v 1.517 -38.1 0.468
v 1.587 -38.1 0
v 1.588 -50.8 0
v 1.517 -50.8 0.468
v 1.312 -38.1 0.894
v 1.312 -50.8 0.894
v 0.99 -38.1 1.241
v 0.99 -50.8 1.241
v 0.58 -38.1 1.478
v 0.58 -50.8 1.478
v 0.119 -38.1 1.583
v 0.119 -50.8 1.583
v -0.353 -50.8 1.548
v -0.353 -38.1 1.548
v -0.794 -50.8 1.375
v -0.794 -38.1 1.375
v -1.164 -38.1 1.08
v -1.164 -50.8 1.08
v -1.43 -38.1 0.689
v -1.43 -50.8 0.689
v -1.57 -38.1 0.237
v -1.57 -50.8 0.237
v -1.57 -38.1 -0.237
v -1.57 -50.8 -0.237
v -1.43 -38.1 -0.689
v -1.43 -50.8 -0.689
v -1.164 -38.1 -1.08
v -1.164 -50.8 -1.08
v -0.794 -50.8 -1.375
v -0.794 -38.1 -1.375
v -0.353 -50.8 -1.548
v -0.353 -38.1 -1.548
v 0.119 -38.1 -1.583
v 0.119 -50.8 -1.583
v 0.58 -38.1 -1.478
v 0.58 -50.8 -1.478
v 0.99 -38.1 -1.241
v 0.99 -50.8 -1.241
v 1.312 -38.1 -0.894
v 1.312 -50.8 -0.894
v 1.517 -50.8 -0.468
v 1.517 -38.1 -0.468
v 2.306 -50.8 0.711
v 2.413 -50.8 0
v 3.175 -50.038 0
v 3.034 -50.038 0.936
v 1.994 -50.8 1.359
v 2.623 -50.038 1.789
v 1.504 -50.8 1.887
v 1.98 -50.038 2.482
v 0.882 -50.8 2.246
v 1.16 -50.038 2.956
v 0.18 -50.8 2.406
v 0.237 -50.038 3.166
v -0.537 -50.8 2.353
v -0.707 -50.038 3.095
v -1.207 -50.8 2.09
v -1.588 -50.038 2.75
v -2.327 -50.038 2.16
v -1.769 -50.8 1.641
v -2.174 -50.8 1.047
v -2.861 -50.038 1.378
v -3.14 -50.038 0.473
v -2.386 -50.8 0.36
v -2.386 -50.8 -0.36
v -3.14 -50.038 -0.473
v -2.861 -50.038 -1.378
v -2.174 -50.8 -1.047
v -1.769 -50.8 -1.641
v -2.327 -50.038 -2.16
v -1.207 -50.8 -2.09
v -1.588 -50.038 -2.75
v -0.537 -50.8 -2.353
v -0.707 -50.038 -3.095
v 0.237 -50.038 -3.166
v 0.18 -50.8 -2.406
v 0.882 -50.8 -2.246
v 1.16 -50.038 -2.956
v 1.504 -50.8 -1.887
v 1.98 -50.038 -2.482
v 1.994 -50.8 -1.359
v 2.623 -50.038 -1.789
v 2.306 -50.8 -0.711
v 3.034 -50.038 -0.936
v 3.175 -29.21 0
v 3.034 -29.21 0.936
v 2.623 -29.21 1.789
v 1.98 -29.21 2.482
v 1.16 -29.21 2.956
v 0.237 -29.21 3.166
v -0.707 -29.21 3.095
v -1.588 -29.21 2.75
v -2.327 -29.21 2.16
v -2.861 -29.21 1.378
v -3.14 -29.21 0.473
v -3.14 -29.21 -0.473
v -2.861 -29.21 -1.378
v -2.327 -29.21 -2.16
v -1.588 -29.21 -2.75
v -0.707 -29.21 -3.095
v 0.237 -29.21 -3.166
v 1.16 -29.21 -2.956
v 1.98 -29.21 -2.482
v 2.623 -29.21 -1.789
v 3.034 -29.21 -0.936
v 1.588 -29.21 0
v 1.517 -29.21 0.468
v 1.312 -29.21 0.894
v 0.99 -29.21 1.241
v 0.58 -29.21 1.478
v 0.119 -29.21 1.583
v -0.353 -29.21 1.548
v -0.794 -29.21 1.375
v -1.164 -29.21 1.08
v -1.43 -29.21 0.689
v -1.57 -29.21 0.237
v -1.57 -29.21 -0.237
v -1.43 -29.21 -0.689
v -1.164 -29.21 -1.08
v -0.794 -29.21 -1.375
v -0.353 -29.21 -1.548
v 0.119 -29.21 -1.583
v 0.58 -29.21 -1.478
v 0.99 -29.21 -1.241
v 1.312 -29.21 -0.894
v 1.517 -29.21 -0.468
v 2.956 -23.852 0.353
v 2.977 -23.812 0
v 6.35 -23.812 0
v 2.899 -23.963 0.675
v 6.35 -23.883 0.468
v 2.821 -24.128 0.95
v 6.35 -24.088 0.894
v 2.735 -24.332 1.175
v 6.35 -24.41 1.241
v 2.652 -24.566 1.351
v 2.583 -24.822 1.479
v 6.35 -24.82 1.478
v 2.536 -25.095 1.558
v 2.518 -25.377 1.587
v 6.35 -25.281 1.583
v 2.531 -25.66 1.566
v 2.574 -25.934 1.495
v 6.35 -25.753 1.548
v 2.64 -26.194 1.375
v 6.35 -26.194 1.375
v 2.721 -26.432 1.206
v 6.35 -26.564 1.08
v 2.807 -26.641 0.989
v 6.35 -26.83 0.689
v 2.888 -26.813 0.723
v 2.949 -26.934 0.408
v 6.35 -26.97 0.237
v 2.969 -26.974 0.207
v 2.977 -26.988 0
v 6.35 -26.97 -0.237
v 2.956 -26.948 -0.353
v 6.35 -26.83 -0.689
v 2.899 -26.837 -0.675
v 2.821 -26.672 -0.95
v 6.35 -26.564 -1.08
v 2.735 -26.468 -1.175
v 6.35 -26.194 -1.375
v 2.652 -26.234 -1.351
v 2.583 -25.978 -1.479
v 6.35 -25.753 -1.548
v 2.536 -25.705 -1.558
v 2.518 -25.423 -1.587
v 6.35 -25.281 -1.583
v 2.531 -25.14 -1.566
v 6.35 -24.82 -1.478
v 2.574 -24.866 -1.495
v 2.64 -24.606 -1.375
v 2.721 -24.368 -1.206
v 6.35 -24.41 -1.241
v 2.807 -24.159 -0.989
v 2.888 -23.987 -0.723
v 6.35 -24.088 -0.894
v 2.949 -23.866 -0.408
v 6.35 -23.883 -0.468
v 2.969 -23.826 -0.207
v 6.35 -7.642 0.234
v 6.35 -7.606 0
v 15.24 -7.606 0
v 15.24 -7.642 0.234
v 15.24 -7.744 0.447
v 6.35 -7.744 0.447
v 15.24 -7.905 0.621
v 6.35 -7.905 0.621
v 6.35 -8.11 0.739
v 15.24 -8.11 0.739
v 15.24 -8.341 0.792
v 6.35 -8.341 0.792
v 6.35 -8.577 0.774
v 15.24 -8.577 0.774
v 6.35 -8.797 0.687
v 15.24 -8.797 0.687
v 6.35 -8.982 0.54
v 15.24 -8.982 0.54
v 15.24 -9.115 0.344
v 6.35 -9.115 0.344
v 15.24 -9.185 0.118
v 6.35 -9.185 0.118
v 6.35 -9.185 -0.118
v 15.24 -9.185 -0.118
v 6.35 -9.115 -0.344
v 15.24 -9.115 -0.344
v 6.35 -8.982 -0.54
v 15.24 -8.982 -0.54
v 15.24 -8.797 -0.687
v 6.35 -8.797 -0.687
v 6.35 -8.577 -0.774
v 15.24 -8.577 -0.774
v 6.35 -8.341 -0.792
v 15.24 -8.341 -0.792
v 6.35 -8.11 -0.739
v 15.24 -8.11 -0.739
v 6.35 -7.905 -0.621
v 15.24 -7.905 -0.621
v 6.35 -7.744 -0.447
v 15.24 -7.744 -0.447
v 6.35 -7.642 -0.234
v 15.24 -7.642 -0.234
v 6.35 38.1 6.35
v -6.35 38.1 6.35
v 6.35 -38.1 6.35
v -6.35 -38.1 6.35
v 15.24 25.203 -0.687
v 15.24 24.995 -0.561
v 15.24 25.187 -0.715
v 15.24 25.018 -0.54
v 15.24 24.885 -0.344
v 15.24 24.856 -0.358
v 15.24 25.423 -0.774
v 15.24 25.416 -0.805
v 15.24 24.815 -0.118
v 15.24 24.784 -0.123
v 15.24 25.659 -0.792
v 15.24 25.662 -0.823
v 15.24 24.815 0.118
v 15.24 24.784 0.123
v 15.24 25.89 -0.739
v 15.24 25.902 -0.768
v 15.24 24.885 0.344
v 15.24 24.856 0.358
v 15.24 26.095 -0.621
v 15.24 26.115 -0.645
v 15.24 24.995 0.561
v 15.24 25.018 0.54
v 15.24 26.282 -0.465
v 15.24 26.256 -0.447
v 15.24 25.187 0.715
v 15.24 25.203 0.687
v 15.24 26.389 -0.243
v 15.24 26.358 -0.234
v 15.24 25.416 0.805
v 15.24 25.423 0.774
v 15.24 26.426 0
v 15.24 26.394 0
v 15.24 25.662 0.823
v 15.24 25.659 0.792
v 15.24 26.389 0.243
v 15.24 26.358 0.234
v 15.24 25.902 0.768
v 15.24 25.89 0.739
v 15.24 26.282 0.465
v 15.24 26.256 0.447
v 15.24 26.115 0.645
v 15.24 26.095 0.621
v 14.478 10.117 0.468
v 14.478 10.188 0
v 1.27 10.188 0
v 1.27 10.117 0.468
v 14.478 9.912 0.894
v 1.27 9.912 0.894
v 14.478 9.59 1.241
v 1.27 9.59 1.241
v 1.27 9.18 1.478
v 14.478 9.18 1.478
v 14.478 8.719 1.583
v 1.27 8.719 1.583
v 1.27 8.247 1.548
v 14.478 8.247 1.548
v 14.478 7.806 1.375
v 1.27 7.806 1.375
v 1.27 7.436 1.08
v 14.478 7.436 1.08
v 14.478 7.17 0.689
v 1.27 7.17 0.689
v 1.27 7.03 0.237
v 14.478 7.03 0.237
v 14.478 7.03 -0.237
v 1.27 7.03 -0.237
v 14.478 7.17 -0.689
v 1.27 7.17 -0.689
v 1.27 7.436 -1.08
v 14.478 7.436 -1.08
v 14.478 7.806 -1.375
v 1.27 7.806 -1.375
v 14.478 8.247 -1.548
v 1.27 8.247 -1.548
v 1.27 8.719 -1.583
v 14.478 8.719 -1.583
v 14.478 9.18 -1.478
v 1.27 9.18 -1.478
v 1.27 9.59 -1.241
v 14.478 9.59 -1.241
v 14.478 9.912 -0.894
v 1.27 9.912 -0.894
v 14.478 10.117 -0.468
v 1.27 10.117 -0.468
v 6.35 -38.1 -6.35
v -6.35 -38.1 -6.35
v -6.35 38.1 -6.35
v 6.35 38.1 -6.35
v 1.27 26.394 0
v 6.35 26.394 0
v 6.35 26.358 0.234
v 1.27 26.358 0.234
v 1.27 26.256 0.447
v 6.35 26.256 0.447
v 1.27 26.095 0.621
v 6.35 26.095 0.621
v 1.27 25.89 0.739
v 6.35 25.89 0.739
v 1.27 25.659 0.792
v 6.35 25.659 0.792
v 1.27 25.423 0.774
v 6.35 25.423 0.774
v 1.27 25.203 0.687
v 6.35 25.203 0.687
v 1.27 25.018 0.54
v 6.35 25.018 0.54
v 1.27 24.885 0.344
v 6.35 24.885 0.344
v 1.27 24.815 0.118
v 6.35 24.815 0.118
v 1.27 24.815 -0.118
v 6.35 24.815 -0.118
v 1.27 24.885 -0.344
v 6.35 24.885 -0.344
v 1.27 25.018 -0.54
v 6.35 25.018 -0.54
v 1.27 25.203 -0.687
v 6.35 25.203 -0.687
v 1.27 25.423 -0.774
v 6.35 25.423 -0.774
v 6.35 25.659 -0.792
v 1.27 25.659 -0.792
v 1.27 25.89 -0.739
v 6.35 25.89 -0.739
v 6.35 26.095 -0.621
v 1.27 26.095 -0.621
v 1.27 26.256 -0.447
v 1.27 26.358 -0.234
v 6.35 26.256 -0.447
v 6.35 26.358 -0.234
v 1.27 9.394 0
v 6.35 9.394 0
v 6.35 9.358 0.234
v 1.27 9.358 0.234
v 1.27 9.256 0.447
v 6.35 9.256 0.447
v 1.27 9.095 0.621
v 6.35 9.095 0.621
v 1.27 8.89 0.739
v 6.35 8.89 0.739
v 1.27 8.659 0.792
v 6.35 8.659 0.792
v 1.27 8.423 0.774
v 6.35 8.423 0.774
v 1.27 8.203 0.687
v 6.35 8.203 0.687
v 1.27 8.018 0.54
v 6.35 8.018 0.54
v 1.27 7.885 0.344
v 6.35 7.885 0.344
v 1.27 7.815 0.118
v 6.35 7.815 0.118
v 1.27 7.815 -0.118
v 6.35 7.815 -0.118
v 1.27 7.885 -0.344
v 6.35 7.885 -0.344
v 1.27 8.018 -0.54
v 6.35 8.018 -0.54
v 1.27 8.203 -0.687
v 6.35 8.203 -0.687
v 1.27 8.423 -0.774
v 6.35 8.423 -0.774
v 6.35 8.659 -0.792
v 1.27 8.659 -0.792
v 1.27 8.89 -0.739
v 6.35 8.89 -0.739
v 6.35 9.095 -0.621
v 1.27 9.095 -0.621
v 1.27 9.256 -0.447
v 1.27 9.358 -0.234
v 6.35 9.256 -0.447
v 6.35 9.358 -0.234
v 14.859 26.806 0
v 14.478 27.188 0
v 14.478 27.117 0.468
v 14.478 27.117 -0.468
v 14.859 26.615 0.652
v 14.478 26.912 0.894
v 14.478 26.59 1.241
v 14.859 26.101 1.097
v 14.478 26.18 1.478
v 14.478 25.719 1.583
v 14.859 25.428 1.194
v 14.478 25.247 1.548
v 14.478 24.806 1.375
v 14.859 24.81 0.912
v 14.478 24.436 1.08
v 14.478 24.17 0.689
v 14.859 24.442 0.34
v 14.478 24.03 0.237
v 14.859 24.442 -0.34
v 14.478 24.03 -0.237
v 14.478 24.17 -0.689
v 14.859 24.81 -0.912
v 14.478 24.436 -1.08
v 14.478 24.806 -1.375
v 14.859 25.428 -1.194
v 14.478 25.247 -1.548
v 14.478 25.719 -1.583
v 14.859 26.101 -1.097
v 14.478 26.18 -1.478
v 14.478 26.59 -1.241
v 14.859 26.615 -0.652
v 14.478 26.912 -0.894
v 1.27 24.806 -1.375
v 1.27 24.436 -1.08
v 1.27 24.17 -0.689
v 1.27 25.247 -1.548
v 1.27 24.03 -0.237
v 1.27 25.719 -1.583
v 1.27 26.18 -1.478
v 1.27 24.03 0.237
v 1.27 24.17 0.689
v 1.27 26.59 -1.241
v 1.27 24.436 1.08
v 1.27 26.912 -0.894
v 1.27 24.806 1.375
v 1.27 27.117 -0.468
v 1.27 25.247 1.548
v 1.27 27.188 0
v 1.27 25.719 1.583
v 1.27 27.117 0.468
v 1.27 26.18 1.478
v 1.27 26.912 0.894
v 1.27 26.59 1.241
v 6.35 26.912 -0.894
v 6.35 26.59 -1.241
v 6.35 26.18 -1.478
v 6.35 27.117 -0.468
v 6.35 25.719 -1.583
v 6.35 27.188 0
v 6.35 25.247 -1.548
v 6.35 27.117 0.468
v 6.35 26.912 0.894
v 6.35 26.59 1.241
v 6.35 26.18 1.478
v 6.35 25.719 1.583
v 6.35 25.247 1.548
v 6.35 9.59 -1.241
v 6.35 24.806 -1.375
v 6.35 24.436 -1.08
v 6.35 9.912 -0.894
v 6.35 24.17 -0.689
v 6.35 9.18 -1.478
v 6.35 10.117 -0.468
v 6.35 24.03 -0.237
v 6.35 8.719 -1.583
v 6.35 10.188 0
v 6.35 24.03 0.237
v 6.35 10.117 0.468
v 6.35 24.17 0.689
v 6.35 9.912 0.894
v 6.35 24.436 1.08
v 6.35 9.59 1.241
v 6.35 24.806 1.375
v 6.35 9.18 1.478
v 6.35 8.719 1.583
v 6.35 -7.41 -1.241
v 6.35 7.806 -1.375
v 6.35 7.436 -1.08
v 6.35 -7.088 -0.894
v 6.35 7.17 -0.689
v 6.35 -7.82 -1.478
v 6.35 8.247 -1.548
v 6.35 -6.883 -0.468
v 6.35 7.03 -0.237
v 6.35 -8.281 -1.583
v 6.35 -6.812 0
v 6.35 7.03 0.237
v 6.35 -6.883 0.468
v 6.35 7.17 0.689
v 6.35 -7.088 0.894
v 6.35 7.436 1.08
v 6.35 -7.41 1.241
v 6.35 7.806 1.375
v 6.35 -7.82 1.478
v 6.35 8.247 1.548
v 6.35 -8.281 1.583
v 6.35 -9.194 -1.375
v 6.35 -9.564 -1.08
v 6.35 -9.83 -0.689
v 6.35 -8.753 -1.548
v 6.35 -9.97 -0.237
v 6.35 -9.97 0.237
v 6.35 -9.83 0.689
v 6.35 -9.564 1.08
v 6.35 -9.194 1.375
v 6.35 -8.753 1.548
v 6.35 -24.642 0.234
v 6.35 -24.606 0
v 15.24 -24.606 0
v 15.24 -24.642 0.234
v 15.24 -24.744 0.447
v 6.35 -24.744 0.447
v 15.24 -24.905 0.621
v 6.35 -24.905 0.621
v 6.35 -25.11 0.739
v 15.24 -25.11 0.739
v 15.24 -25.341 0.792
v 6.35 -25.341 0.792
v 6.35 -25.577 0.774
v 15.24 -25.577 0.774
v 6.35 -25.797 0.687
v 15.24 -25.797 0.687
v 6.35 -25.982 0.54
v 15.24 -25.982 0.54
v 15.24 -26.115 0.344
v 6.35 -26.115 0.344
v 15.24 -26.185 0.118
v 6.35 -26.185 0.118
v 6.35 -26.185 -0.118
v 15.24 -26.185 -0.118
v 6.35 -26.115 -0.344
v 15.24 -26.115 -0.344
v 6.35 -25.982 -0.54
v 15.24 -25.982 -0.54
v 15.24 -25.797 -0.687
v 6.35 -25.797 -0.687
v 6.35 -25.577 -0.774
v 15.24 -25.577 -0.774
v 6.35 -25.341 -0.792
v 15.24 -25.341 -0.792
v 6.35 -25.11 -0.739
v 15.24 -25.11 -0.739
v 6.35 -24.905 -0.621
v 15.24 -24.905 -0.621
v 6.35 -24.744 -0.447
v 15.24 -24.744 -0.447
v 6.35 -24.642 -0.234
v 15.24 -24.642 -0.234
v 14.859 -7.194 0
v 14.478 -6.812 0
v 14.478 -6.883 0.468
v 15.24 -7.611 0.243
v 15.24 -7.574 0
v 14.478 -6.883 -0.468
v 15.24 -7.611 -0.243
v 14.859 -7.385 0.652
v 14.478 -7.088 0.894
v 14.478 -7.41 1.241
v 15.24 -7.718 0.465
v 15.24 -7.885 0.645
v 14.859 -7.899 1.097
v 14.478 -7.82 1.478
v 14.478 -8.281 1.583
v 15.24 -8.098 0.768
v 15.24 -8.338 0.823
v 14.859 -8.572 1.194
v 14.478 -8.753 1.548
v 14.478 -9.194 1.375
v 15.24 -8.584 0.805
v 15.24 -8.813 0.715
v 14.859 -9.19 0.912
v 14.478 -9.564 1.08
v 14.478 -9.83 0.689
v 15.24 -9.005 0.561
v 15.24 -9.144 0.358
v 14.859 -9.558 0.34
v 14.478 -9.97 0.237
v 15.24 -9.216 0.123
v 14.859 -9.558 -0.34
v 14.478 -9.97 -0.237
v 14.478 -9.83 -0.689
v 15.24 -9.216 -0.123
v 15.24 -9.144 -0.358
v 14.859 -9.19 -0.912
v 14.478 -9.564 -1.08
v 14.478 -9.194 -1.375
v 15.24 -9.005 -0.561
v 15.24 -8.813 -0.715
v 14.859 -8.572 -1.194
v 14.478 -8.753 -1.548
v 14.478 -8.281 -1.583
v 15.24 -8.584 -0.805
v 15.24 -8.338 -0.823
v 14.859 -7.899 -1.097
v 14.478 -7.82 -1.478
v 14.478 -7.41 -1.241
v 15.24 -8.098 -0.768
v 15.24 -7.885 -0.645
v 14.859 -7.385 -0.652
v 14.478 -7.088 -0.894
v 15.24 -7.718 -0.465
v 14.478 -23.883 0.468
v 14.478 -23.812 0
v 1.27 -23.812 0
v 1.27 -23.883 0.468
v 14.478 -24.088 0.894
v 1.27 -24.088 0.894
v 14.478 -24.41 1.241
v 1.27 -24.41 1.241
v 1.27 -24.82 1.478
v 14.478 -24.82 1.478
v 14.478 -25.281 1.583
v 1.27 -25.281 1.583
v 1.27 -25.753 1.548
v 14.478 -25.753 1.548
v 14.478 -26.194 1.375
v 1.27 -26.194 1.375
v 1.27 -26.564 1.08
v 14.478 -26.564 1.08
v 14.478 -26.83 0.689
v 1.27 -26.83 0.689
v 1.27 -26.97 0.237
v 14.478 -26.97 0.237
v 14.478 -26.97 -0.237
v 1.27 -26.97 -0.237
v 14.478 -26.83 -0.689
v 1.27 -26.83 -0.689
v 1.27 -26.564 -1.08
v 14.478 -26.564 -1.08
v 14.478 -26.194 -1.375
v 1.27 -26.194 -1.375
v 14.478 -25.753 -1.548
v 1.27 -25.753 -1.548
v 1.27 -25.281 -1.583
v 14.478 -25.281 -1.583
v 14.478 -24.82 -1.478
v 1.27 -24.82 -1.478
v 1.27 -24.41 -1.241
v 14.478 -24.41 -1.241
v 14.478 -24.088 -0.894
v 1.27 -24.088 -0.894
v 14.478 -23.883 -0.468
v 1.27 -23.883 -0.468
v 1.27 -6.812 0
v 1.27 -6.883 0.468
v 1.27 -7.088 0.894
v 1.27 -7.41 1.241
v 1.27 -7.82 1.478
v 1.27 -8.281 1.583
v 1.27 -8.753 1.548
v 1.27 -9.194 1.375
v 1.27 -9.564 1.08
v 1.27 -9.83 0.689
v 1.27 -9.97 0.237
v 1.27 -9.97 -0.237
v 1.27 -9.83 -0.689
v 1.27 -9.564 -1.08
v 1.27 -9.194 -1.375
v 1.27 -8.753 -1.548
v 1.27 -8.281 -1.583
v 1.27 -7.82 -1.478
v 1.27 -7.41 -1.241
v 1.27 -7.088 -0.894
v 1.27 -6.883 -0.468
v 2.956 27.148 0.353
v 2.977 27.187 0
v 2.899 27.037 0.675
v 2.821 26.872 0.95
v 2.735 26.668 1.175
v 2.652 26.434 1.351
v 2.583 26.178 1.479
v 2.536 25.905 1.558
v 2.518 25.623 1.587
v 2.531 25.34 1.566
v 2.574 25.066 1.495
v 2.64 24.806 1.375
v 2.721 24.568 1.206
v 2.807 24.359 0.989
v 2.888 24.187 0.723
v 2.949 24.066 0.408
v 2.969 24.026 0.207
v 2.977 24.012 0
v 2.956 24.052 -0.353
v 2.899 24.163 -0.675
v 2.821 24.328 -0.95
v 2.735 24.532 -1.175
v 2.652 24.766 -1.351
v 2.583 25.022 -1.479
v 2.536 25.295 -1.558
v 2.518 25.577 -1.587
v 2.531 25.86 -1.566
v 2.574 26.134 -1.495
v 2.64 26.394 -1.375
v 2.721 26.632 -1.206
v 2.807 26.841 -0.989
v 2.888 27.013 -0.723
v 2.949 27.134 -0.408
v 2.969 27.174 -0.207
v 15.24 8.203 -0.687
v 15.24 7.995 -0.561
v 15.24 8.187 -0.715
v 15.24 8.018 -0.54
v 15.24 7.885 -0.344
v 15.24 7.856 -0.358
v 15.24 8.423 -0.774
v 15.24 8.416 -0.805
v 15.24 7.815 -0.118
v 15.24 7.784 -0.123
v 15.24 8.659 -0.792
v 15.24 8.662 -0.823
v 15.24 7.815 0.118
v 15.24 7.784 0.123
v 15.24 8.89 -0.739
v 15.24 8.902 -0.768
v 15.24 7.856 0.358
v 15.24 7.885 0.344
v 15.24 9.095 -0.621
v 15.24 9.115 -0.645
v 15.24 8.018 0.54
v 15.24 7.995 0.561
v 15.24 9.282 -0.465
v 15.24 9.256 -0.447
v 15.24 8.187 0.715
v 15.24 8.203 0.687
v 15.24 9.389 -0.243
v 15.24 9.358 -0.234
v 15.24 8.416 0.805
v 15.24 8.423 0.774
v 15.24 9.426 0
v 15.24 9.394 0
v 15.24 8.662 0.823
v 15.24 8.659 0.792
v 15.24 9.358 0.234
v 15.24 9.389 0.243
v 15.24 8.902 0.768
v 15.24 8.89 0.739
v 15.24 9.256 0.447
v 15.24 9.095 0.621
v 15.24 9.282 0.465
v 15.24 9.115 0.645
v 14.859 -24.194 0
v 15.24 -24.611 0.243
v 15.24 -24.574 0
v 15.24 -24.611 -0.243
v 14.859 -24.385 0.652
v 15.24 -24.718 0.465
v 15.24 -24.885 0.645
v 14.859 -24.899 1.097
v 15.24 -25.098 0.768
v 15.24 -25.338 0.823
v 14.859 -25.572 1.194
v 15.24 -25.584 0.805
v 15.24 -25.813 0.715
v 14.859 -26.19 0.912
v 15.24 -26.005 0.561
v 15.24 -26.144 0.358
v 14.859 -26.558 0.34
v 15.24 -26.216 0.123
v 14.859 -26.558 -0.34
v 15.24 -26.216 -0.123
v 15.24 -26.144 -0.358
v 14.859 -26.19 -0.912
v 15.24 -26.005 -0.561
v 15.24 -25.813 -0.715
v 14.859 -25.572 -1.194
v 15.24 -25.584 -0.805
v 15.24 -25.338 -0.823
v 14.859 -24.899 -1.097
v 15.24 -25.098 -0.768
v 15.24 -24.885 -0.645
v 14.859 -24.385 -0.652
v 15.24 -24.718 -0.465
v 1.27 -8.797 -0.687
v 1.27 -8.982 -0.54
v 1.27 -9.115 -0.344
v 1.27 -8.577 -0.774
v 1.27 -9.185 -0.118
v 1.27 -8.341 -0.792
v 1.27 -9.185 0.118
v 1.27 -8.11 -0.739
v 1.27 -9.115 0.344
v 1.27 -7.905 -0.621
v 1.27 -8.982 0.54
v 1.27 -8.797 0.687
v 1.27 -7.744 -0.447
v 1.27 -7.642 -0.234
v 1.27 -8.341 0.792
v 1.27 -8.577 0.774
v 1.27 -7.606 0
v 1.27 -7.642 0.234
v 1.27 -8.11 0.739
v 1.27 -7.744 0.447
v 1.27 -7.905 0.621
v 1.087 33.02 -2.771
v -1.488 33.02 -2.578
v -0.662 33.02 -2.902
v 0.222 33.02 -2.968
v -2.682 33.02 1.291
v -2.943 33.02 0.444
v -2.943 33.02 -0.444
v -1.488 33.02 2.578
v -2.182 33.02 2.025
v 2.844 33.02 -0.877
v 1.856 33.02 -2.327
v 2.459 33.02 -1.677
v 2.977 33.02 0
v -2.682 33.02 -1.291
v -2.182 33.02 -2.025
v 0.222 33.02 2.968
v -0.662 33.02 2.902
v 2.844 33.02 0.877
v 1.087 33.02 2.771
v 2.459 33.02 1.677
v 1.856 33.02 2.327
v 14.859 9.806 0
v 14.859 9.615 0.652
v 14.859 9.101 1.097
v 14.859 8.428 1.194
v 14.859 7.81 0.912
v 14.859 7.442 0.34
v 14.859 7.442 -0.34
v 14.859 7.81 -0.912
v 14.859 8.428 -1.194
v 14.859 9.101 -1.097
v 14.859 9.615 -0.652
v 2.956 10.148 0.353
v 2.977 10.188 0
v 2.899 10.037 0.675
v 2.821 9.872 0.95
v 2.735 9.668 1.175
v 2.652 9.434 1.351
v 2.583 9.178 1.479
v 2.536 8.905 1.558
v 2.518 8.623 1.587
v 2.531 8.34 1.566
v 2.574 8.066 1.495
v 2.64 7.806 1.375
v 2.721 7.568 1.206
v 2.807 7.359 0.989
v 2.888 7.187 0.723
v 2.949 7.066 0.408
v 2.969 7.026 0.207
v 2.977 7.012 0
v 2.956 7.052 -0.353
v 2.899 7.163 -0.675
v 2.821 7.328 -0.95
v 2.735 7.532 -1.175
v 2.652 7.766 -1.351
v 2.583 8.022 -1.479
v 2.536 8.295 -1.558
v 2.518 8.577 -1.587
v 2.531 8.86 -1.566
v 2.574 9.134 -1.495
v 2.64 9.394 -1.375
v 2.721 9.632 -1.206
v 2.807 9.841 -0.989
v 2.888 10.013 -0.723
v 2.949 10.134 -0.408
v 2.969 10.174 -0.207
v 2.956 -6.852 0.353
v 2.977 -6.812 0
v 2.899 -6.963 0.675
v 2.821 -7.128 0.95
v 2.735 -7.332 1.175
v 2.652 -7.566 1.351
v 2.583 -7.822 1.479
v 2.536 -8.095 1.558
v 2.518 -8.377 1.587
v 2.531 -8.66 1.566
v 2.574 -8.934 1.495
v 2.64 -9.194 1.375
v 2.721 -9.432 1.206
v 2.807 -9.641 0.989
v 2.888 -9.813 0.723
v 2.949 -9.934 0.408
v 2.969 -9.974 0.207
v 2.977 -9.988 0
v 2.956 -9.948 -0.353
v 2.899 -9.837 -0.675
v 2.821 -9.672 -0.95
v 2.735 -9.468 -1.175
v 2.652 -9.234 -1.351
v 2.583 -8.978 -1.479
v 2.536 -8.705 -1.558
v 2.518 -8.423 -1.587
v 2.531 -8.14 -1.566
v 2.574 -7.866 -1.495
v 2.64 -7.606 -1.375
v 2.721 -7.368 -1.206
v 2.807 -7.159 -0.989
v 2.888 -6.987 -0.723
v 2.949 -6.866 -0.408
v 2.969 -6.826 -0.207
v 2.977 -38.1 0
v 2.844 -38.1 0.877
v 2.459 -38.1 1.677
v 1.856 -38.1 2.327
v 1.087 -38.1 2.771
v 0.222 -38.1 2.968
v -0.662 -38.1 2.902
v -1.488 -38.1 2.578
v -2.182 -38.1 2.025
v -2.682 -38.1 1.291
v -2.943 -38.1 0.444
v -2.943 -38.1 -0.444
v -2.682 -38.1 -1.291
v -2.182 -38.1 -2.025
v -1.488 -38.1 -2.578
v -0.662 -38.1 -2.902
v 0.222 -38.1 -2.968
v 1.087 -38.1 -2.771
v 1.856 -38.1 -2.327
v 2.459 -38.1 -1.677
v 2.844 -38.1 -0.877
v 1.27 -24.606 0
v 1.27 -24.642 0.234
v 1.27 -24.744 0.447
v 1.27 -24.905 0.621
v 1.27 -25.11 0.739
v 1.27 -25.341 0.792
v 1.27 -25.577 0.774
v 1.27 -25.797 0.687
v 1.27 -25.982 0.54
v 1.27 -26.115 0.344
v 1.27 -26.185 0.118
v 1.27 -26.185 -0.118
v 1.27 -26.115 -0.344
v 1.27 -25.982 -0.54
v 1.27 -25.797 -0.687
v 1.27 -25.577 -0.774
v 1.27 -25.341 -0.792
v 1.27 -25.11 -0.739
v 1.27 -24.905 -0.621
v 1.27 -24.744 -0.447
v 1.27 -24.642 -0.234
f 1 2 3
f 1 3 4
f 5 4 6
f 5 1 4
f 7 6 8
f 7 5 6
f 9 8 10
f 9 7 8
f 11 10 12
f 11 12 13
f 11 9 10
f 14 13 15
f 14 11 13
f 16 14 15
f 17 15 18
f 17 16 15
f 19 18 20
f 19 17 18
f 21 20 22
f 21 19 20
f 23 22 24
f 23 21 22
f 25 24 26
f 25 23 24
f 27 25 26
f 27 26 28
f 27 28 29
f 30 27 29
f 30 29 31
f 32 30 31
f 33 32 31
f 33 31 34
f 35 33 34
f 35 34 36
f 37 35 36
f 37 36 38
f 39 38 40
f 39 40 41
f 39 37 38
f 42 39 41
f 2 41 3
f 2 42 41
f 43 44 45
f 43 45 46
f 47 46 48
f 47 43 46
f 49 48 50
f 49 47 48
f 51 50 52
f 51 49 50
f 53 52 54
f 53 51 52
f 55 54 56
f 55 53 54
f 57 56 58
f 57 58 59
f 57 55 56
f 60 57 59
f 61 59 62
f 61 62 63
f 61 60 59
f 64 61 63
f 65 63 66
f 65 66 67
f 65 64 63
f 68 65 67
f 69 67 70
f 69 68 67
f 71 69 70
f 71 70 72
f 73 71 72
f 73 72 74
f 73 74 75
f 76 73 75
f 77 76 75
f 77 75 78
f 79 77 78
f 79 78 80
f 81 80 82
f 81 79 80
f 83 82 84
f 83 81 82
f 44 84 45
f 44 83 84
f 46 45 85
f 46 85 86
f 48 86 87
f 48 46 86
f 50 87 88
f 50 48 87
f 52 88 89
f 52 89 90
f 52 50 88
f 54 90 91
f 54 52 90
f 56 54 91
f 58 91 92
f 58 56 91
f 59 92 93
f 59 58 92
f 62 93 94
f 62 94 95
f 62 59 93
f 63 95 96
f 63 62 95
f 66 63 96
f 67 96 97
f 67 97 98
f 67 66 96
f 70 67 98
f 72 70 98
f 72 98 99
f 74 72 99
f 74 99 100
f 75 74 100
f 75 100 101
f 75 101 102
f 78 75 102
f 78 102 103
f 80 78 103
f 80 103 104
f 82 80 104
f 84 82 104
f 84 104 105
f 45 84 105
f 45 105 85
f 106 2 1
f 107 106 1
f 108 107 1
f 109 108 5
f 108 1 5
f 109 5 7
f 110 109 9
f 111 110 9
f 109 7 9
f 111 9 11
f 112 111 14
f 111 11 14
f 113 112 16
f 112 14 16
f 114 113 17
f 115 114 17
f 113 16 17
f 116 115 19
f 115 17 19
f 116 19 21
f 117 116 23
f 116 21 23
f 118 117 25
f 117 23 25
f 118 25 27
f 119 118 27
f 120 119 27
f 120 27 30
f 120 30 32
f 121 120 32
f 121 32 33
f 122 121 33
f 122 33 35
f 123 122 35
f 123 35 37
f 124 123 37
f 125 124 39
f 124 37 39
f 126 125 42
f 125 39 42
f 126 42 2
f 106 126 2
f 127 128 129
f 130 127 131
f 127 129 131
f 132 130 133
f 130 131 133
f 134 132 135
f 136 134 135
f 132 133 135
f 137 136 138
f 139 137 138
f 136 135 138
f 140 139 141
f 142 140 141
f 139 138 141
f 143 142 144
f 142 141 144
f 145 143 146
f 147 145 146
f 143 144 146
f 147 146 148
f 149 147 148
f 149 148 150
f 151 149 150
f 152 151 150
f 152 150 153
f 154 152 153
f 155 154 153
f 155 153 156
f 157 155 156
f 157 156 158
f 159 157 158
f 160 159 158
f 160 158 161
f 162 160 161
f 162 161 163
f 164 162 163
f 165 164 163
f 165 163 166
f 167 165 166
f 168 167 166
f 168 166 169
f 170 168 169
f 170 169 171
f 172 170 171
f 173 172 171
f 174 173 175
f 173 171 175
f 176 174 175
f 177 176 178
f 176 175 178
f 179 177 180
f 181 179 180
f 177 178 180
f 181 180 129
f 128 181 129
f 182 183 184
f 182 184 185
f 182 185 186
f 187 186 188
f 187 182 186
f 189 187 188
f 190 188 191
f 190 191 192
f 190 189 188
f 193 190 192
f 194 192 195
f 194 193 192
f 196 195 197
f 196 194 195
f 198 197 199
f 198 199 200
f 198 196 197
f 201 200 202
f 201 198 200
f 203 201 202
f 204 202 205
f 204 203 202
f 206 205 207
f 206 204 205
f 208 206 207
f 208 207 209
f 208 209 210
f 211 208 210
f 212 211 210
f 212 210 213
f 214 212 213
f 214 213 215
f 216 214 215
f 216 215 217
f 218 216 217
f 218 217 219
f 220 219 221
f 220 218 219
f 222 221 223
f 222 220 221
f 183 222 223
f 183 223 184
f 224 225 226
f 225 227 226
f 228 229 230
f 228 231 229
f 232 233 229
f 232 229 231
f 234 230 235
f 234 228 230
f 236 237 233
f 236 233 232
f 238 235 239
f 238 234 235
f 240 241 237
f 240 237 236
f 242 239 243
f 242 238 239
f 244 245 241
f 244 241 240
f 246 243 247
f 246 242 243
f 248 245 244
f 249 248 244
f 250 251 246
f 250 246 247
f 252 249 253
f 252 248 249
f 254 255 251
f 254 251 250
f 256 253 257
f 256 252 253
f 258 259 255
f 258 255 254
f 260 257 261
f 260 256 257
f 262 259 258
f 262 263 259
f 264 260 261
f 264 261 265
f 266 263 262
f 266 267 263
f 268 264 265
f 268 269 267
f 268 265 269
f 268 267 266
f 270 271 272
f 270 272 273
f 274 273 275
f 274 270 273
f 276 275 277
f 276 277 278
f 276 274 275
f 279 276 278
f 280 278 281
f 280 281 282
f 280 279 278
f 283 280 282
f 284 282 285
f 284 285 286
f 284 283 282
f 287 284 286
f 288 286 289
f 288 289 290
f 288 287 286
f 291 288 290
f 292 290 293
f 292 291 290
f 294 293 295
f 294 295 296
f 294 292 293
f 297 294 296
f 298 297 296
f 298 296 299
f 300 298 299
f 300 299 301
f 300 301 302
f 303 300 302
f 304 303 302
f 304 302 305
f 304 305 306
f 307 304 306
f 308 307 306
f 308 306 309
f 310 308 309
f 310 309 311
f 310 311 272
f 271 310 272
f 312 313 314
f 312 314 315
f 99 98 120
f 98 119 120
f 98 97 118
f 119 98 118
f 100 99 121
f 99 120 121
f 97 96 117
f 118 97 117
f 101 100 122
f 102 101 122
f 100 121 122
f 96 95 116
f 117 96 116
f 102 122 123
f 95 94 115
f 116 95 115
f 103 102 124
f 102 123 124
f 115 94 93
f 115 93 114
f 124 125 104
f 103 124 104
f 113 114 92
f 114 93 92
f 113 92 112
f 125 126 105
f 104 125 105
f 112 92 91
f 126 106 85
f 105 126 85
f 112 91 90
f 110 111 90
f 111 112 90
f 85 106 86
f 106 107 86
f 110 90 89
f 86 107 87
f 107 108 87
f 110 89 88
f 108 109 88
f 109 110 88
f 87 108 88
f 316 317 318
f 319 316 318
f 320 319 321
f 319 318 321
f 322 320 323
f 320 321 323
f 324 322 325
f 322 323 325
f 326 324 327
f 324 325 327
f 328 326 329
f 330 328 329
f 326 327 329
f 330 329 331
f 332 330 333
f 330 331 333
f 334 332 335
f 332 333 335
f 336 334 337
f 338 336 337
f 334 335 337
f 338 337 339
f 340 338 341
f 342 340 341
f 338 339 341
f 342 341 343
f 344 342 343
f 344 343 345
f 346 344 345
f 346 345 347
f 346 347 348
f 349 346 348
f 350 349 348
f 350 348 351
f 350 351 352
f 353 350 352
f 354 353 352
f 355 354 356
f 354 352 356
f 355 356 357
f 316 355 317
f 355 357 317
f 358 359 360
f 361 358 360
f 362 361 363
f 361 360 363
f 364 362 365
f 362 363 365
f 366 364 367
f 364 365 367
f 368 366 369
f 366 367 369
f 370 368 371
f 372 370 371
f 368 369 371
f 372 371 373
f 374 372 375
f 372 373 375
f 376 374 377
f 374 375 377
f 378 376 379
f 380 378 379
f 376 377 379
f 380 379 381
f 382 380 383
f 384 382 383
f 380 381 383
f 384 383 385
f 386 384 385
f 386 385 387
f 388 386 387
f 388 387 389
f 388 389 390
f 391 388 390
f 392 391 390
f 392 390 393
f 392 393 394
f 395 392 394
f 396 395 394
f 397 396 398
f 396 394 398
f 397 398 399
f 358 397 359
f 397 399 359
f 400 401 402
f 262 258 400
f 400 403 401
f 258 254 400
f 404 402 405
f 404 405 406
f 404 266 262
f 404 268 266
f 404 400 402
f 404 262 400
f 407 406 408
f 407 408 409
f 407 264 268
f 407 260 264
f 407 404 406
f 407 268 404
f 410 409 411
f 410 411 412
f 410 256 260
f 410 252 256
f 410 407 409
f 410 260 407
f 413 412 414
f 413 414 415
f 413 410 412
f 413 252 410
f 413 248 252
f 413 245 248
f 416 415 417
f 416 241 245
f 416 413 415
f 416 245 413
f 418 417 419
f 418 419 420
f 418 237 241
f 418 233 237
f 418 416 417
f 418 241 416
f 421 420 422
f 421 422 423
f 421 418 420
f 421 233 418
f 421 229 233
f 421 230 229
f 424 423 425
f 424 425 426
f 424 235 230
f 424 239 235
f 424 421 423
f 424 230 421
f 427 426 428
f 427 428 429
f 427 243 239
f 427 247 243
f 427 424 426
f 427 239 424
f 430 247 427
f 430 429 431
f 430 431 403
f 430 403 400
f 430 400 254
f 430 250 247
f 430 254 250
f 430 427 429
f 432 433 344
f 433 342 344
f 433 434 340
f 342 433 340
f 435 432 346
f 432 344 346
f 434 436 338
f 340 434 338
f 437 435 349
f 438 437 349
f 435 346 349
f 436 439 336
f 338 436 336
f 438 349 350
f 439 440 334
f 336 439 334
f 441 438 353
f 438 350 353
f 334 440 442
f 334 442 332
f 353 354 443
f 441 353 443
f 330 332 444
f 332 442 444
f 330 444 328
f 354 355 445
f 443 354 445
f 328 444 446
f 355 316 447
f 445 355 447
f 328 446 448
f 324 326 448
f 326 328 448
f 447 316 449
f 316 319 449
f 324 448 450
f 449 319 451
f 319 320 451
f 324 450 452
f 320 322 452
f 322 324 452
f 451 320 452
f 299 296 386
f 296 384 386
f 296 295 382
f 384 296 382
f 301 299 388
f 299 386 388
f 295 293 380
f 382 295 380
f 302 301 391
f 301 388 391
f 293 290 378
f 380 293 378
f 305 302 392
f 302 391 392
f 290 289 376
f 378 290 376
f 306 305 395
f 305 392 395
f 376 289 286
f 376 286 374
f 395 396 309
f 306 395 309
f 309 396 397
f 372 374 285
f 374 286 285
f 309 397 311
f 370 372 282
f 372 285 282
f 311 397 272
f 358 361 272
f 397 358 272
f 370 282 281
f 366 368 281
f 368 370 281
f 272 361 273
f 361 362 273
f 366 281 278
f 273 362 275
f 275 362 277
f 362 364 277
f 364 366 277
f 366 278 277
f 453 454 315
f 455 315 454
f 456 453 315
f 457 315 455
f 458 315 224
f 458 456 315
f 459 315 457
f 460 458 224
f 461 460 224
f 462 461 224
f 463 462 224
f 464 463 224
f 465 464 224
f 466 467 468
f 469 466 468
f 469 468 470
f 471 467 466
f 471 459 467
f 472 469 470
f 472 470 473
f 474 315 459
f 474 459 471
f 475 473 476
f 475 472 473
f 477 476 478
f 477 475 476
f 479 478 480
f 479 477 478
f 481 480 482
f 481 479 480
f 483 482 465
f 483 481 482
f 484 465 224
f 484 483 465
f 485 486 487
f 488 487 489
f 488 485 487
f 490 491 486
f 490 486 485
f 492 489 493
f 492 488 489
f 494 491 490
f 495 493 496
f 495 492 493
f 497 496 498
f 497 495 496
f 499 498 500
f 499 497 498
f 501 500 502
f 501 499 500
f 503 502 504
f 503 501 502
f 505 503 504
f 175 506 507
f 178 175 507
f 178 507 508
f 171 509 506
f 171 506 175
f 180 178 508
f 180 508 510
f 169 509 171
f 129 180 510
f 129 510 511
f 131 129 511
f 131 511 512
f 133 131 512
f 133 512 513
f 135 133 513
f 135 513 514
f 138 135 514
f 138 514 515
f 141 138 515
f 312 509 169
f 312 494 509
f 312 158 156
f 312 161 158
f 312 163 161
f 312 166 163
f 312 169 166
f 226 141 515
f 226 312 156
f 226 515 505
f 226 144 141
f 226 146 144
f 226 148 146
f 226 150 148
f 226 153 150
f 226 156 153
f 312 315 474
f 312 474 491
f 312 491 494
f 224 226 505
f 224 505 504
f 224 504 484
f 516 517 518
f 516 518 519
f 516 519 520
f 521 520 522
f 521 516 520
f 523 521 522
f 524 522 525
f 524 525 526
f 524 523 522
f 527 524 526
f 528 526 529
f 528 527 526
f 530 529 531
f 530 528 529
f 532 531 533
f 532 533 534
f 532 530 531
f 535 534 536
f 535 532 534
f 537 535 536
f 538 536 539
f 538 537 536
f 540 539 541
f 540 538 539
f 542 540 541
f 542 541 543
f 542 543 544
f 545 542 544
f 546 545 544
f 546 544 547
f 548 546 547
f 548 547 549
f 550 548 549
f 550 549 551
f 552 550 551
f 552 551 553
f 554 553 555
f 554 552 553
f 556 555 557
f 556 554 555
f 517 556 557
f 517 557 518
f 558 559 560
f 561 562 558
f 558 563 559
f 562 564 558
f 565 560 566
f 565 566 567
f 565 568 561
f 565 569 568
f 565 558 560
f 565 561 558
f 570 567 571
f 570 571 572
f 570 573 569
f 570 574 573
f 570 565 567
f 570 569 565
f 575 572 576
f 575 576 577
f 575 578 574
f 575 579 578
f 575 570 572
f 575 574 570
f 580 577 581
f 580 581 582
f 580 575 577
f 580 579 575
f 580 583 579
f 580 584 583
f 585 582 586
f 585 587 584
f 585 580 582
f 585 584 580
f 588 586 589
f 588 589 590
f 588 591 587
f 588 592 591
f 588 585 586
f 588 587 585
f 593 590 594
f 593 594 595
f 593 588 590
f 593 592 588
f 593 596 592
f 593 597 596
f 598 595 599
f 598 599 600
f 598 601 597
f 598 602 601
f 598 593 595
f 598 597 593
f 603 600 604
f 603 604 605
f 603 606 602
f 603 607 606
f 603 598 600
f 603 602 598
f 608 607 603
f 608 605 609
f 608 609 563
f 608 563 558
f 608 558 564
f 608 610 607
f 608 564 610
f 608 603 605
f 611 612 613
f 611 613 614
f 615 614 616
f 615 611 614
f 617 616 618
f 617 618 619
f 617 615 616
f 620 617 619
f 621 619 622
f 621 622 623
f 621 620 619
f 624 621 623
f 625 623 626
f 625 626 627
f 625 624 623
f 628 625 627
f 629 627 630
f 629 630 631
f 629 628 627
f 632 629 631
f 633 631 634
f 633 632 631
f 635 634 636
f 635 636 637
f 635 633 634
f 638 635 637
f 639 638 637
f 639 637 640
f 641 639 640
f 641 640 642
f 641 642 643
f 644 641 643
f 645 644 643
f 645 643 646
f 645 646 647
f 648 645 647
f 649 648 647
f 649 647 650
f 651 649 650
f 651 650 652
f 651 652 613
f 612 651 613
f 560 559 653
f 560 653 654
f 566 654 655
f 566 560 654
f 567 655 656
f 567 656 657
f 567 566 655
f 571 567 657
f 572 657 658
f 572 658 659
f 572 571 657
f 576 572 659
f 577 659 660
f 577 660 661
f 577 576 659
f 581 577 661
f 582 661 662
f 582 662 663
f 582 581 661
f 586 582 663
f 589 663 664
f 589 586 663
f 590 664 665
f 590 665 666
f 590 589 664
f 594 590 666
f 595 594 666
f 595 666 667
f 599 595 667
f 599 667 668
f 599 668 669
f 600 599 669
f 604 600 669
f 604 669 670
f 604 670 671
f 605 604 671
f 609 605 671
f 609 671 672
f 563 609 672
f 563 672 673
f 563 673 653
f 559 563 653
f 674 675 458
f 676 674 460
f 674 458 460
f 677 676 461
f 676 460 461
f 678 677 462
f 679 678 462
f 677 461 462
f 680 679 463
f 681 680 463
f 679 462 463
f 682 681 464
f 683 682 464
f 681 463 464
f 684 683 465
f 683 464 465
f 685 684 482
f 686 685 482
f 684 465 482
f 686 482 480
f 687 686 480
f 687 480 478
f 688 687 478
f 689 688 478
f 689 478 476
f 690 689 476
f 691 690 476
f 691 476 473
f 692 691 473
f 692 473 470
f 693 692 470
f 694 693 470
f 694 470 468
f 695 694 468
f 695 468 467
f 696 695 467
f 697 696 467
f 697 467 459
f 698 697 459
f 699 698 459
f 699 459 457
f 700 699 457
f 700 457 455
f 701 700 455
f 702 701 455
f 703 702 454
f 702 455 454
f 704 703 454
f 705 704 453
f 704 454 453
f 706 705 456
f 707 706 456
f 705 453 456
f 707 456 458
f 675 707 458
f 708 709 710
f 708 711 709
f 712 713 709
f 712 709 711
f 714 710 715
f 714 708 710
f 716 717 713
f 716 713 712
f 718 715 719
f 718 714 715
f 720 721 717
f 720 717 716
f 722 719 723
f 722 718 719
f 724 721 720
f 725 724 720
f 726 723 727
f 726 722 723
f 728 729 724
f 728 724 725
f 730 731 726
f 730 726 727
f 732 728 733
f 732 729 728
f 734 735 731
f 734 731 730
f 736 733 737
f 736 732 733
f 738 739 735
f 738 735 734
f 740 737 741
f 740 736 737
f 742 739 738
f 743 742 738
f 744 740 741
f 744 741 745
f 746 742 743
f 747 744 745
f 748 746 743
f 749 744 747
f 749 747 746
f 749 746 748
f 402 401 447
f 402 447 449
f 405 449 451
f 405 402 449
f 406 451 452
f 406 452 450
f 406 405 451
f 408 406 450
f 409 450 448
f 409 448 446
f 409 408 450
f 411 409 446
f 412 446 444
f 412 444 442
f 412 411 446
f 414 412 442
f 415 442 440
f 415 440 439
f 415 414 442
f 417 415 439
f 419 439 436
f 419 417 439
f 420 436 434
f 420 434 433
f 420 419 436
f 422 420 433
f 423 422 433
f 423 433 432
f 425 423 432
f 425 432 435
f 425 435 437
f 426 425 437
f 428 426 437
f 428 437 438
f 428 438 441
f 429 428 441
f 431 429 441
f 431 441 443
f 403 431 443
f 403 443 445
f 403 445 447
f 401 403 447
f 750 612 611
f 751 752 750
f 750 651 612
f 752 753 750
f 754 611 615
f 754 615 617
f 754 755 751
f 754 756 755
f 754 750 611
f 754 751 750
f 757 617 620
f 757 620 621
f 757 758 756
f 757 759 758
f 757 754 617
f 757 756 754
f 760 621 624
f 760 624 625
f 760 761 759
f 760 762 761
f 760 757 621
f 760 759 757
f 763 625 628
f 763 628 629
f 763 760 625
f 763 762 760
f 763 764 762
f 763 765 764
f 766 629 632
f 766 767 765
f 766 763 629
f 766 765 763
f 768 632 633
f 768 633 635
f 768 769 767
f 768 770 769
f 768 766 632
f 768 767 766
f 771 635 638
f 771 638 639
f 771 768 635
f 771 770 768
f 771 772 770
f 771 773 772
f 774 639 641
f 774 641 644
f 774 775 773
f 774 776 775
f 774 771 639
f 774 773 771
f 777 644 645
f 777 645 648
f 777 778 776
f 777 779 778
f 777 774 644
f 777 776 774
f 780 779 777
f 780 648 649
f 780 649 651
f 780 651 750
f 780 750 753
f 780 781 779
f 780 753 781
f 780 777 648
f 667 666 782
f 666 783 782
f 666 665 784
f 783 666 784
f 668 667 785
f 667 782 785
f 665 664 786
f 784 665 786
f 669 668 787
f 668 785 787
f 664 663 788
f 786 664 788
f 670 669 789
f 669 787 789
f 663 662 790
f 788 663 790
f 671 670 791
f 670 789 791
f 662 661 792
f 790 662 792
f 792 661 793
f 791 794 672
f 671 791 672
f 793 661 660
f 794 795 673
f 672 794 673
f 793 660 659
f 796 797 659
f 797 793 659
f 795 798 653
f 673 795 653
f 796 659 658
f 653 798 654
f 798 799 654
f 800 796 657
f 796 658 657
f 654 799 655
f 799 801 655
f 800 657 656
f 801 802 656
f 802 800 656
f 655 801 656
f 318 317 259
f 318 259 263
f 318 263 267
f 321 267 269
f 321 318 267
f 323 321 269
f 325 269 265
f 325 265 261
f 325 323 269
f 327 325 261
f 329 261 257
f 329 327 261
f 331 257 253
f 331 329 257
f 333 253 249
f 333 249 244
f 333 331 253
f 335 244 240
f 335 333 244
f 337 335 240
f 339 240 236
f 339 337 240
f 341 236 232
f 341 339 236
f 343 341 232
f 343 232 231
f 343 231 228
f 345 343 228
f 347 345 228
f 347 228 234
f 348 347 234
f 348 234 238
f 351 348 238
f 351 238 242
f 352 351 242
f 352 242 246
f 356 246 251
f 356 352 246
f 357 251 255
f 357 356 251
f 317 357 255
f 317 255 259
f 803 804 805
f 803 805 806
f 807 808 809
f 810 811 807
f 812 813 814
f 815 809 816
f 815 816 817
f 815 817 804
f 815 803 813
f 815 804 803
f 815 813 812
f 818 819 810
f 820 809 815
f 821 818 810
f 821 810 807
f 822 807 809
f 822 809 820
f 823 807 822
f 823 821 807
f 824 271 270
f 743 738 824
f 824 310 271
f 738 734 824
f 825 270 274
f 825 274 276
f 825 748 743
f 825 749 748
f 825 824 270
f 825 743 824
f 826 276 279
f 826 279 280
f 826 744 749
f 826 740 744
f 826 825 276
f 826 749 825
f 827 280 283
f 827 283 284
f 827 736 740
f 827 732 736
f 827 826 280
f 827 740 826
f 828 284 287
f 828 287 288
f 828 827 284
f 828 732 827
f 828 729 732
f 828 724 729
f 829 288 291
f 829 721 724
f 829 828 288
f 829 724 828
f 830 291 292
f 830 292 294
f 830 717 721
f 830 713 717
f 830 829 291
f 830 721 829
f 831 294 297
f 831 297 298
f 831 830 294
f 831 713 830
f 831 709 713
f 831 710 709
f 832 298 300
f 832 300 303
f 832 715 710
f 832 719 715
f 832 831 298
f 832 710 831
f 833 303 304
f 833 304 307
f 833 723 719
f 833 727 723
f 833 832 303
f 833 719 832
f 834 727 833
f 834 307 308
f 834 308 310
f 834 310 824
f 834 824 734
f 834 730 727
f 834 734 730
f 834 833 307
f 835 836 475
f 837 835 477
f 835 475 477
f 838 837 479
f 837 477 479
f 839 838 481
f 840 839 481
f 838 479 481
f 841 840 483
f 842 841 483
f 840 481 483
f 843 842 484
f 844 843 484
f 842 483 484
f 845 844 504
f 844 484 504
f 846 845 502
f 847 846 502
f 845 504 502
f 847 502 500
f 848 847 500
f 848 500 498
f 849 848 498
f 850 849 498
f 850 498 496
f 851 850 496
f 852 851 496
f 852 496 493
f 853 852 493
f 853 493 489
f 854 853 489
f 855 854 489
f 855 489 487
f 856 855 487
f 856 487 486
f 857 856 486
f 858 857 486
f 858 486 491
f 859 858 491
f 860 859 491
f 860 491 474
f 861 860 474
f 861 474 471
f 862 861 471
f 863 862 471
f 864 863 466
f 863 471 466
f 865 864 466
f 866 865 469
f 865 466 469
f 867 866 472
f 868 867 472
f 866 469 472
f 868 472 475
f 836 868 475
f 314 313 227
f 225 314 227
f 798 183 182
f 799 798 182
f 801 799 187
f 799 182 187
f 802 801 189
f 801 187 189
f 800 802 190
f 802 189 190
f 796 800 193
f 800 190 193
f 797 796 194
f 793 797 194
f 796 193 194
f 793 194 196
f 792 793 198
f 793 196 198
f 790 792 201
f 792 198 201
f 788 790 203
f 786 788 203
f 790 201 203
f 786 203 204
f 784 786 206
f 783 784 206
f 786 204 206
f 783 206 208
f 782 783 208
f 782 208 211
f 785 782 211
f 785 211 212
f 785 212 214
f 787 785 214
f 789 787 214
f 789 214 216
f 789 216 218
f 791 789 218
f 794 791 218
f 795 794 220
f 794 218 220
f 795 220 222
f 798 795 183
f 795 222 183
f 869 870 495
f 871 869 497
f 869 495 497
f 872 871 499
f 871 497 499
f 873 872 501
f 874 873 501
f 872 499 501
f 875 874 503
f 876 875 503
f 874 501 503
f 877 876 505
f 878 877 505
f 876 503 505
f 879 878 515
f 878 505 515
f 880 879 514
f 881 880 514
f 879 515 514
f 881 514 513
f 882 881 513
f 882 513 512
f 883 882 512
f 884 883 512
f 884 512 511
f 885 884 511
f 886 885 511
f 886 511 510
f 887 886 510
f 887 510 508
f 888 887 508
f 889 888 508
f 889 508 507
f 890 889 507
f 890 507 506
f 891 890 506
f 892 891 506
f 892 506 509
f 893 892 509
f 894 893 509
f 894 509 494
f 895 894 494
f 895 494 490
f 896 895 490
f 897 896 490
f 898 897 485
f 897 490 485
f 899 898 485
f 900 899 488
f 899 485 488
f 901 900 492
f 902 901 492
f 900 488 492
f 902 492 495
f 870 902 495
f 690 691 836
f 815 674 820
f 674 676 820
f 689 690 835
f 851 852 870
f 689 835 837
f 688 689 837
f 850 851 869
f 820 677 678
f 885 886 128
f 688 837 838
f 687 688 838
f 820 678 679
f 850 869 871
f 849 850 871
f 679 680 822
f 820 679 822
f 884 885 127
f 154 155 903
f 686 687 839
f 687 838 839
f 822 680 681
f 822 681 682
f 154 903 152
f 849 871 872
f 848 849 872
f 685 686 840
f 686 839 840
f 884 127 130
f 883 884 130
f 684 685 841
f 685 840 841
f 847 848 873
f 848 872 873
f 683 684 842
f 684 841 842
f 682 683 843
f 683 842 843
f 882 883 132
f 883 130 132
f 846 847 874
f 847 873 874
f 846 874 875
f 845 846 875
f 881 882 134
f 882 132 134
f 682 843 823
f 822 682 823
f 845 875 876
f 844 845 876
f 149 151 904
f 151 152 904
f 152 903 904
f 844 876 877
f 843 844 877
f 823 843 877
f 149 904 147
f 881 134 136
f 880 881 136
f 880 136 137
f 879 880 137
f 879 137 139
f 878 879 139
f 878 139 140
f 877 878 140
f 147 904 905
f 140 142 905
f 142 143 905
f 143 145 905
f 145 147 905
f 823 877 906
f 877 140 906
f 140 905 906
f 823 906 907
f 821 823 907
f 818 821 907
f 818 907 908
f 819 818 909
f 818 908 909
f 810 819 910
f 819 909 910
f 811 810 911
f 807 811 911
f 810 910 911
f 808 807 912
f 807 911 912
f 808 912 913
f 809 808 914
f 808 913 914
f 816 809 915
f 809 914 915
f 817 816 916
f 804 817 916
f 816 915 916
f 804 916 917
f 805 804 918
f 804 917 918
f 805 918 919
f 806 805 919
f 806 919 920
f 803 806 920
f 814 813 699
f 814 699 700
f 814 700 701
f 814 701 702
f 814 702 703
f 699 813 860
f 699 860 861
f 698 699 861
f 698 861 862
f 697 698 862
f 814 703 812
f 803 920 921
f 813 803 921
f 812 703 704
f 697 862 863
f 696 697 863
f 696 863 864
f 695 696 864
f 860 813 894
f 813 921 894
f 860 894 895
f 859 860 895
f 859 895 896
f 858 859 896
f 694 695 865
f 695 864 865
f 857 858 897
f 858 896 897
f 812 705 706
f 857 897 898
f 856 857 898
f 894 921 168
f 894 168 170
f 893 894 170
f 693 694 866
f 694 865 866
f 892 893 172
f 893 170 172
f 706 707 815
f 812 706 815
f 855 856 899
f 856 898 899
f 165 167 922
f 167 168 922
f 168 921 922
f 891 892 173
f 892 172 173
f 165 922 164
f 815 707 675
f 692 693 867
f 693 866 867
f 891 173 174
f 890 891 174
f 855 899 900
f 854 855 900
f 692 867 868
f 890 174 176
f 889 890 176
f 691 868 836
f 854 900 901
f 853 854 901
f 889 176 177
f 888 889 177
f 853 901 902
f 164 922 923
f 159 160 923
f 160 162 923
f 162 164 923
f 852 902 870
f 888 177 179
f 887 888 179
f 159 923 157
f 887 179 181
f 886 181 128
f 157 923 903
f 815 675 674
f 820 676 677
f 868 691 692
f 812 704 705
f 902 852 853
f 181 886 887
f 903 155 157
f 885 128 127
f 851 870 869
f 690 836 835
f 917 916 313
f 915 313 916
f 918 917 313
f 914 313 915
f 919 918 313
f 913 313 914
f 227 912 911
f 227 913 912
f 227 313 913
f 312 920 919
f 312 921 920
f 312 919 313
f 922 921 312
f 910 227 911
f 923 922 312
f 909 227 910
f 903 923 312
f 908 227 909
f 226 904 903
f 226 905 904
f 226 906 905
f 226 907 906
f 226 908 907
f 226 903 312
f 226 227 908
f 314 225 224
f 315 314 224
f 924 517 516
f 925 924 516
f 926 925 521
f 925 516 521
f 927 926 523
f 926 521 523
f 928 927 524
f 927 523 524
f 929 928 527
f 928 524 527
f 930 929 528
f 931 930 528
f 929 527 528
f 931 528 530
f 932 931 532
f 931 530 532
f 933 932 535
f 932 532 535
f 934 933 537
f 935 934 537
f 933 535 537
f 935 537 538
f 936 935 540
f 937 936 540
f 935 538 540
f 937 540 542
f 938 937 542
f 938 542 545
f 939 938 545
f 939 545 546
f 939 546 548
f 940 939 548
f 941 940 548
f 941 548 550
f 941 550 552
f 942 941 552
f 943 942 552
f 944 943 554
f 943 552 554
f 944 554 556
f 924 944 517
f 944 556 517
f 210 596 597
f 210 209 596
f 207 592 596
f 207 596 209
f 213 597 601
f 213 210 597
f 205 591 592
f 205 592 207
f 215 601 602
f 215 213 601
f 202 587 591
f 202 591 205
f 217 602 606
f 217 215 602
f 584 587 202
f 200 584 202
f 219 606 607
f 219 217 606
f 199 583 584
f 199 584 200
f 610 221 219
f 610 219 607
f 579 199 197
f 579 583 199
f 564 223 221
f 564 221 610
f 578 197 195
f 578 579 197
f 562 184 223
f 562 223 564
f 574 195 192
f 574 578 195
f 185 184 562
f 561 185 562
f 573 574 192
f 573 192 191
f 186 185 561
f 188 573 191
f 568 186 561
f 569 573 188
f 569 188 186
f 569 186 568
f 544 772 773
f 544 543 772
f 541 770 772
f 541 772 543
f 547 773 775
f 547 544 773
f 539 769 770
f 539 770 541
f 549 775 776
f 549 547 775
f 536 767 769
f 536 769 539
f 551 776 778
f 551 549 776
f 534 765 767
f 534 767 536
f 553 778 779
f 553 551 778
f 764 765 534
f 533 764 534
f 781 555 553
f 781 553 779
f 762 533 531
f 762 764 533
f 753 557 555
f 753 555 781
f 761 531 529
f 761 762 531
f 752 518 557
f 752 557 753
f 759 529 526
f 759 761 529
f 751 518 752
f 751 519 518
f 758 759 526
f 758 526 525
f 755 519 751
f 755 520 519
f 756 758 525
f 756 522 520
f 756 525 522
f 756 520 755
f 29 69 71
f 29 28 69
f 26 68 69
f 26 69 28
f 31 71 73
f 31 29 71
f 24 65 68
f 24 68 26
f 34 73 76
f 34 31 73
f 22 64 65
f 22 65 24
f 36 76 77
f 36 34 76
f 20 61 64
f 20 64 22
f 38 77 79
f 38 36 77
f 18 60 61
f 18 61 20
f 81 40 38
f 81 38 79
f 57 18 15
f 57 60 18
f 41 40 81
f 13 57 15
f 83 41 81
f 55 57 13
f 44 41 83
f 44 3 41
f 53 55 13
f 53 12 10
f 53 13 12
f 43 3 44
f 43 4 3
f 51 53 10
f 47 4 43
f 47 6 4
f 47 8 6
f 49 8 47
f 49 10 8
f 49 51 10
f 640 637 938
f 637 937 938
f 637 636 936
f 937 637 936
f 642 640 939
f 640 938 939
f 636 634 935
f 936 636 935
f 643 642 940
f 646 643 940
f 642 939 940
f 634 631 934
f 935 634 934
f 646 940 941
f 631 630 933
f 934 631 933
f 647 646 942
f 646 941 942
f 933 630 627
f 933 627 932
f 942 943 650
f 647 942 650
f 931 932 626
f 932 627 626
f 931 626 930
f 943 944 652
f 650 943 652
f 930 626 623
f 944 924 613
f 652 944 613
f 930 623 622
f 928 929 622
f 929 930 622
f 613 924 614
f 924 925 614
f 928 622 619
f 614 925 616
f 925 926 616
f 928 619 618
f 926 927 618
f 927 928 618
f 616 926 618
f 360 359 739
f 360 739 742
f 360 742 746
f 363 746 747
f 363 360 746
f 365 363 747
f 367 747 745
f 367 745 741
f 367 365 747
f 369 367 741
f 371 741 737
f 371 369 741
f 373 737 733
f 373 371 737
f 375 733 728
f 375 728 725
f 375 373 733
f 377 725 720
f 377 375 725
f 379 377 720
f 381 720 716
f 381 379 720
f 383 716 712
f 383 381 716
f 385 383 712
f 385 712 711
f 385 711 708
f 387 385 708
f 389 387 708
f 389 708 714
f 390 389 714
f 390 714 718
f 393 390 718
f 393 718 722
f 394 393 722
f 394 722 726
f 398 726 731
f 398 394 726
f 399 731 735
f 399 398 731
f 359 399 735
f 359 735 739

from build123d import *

# Parameters (mm, degrees)
F0_W          = 12.7
F0_H          = 12.7
F1_DEPTH      = 38.1
F2_R          = 2.9765625
F3_DEPTH      = 71.12
F4_R          = 1.5875
F5_DEPTH      = 3.8331104943
F6_R          = 3.175
F6_R_2        = 1.5875
F7_DEPTH      = 12.7
F7_DEPTH_BACK = 8.89
F8_R          = 1.5875
F8_R_2        = 0.79375
F9_DEPTH      = 8.89
F9_DEPTH_BACK = 5.08
F10_SIZE      = 0.762
F10_2_SIZE    = 0.762
F10_3_SIZE    = 0.762
F10_4_SIZE    = 0.762
F10_5_SIZE    = 0.762


with BuildPart() as f1:
    # F0 (on Front) → F1 (new body, symmetric)
    with BuildSketch(Plane.XZ):
        Rectangle(F0_W, F0_H)
    extrude(amount=F1_DEPTH, both=True)

    # F2 (on face) → F3 (cut)
    with BuildSketch(Plane.XZ.offset(38.1)):
        Circle(F2_R)
    extrude(amount=-F3_DEPTH, mode=Mode.SUBTRACT)

    # F4 (on face) → F5 (cut, through all)
    with BuildSketch(Plane.YZ.offset(6.35)):
        with Locations((-25.4, 0)):
            Circle(F4_R)
        with Locations((-8.4, 0)):
            Circle(F4_R)
        with Locations((8.6, 0)):
            Circle(F4_R)
        with Locations((25.6, 0)):
            Circle(F4_R)
    extrude(amount=-F5_DEPTH, mode=Mode.SUBTRACT)


with BuildPart() as f7:
    # F6 (on face) → F7 (new body, two sides)
    with BuildSketch(Plane.XZ.offset(38.1)) as f7_sk:
        Circle(F6_R)
        Circle(F6_R_2, mode=Mode.SUBTRACT)
    extrude(amount=F7_DEPTH)
    extrude(f7_sk.sketch, amount=-F7_DEPTH_BACK)

    # F10
    f10_edges = [f7.edges().sort_by_distance(p)[0] for p in [
        (-3.175, -50.8, 0),
    ]]
    chamfer(f10_edges, length=F10_SIZE)


with BuildPart() as f9:
    # F8 (on face) → F9 (new body, two sides)
    with BuildSketch(Plane.YZ.offset(6.35)) as f9_sk:
        with Locations((-25.4, 0)):
            Circle(F8_R)
        with Locations((-25.4, 0)):
            Circle(F8_R_2, mode=Mode.SUBTRACT)
    extrude(amount=F9_DEPTH)
    extrude(f9_sk.sketch, amount=-F9_DEPTH_BACK)

    # F10#2
    f10_2_edges = [f9.edges().sort_by_distance(p)[0] for p in [
        (15.24, -26.9875, 0),
    ]]
    chamfer(f10_2_edges, length=F10_2_SIZE)


with BuildPart() as f9b:
    # F8 (on face) → F9, piece 2 (new body, two sides)
    with BuildSketch(Plane.YZ.offset(6.35)) as f9_2_sk:
        with Locations((-8.4, 0)):
            Circle(F8_R)
        with Locations((-8.4, 0)):
            Circle(F8_R_2, mode=Mode.SUBTRACT)
    extrude(amount=F9_DEPTH)
    extrude(f9_2_sk.sketch, amount=-F9_DEPTH_BACK)

    # F10#3
    f10_3_edges = [f9b.edges().sort_by_distance(p)[0] for p in [
        (15.24, -9.9875, 0),
    ]]
    chamfer(f10_3_edges, length=F10_3_SIZE)


with BuildPart() as f9c:
    # F8 (on face) → F9, piece 3 (new body, two sides)
    with BuildSketch(Plane.YZ.offset(6.35)) as f9_3_sk:
        with Locations((8.6, 0)):
            Circle(F8_R)
        with Locations((8.6, 0)):
            Circle(F8_R_2, mode=Mode.SUBTRACT)
    extrude(amount=F9_DEPTH)
    extrude(f9_3_sk.sketch, amount=-F9_DEPTH_BACK)

    # F10#4
    f10_4_edges = [f9c.edges().sort_by_distance(p)[0] for p in [
        (15.24, 7.0125, 0),
    ]]
    chamfer(f10_4_edges, length=F10_4_SIZE)


with BuildPart() as f9d:
    # F8 (on face) → F9, piece 4 (new body, two sides)
    with BuildSketch(Plane.YZ.offset(6.35)) as f9_4_sk:
        with Locations((25.6, 0)):
            Circle(F8_R)
        with Locations((25.6, 0)):
            Circle(F8_R_2, mode=Mode.SUBTRACT)
    extrude(amount=F9_DEPTH)
    extrude(f9_4_sk.sketch, amount=-F9_DEPTH_BACK)

    # F10#5
    f10_5_edges = [f9d.edges().sort_by_distance(p)[0] for p in [
        (15.24, 24.0125, 0),
    ]]
    chamfer(f10_5_edges, length=F10_5_SIZE)


solid = Compound([f1.part, f7.part, f9.part, f9b.part, f9c.part, f9d.part])
